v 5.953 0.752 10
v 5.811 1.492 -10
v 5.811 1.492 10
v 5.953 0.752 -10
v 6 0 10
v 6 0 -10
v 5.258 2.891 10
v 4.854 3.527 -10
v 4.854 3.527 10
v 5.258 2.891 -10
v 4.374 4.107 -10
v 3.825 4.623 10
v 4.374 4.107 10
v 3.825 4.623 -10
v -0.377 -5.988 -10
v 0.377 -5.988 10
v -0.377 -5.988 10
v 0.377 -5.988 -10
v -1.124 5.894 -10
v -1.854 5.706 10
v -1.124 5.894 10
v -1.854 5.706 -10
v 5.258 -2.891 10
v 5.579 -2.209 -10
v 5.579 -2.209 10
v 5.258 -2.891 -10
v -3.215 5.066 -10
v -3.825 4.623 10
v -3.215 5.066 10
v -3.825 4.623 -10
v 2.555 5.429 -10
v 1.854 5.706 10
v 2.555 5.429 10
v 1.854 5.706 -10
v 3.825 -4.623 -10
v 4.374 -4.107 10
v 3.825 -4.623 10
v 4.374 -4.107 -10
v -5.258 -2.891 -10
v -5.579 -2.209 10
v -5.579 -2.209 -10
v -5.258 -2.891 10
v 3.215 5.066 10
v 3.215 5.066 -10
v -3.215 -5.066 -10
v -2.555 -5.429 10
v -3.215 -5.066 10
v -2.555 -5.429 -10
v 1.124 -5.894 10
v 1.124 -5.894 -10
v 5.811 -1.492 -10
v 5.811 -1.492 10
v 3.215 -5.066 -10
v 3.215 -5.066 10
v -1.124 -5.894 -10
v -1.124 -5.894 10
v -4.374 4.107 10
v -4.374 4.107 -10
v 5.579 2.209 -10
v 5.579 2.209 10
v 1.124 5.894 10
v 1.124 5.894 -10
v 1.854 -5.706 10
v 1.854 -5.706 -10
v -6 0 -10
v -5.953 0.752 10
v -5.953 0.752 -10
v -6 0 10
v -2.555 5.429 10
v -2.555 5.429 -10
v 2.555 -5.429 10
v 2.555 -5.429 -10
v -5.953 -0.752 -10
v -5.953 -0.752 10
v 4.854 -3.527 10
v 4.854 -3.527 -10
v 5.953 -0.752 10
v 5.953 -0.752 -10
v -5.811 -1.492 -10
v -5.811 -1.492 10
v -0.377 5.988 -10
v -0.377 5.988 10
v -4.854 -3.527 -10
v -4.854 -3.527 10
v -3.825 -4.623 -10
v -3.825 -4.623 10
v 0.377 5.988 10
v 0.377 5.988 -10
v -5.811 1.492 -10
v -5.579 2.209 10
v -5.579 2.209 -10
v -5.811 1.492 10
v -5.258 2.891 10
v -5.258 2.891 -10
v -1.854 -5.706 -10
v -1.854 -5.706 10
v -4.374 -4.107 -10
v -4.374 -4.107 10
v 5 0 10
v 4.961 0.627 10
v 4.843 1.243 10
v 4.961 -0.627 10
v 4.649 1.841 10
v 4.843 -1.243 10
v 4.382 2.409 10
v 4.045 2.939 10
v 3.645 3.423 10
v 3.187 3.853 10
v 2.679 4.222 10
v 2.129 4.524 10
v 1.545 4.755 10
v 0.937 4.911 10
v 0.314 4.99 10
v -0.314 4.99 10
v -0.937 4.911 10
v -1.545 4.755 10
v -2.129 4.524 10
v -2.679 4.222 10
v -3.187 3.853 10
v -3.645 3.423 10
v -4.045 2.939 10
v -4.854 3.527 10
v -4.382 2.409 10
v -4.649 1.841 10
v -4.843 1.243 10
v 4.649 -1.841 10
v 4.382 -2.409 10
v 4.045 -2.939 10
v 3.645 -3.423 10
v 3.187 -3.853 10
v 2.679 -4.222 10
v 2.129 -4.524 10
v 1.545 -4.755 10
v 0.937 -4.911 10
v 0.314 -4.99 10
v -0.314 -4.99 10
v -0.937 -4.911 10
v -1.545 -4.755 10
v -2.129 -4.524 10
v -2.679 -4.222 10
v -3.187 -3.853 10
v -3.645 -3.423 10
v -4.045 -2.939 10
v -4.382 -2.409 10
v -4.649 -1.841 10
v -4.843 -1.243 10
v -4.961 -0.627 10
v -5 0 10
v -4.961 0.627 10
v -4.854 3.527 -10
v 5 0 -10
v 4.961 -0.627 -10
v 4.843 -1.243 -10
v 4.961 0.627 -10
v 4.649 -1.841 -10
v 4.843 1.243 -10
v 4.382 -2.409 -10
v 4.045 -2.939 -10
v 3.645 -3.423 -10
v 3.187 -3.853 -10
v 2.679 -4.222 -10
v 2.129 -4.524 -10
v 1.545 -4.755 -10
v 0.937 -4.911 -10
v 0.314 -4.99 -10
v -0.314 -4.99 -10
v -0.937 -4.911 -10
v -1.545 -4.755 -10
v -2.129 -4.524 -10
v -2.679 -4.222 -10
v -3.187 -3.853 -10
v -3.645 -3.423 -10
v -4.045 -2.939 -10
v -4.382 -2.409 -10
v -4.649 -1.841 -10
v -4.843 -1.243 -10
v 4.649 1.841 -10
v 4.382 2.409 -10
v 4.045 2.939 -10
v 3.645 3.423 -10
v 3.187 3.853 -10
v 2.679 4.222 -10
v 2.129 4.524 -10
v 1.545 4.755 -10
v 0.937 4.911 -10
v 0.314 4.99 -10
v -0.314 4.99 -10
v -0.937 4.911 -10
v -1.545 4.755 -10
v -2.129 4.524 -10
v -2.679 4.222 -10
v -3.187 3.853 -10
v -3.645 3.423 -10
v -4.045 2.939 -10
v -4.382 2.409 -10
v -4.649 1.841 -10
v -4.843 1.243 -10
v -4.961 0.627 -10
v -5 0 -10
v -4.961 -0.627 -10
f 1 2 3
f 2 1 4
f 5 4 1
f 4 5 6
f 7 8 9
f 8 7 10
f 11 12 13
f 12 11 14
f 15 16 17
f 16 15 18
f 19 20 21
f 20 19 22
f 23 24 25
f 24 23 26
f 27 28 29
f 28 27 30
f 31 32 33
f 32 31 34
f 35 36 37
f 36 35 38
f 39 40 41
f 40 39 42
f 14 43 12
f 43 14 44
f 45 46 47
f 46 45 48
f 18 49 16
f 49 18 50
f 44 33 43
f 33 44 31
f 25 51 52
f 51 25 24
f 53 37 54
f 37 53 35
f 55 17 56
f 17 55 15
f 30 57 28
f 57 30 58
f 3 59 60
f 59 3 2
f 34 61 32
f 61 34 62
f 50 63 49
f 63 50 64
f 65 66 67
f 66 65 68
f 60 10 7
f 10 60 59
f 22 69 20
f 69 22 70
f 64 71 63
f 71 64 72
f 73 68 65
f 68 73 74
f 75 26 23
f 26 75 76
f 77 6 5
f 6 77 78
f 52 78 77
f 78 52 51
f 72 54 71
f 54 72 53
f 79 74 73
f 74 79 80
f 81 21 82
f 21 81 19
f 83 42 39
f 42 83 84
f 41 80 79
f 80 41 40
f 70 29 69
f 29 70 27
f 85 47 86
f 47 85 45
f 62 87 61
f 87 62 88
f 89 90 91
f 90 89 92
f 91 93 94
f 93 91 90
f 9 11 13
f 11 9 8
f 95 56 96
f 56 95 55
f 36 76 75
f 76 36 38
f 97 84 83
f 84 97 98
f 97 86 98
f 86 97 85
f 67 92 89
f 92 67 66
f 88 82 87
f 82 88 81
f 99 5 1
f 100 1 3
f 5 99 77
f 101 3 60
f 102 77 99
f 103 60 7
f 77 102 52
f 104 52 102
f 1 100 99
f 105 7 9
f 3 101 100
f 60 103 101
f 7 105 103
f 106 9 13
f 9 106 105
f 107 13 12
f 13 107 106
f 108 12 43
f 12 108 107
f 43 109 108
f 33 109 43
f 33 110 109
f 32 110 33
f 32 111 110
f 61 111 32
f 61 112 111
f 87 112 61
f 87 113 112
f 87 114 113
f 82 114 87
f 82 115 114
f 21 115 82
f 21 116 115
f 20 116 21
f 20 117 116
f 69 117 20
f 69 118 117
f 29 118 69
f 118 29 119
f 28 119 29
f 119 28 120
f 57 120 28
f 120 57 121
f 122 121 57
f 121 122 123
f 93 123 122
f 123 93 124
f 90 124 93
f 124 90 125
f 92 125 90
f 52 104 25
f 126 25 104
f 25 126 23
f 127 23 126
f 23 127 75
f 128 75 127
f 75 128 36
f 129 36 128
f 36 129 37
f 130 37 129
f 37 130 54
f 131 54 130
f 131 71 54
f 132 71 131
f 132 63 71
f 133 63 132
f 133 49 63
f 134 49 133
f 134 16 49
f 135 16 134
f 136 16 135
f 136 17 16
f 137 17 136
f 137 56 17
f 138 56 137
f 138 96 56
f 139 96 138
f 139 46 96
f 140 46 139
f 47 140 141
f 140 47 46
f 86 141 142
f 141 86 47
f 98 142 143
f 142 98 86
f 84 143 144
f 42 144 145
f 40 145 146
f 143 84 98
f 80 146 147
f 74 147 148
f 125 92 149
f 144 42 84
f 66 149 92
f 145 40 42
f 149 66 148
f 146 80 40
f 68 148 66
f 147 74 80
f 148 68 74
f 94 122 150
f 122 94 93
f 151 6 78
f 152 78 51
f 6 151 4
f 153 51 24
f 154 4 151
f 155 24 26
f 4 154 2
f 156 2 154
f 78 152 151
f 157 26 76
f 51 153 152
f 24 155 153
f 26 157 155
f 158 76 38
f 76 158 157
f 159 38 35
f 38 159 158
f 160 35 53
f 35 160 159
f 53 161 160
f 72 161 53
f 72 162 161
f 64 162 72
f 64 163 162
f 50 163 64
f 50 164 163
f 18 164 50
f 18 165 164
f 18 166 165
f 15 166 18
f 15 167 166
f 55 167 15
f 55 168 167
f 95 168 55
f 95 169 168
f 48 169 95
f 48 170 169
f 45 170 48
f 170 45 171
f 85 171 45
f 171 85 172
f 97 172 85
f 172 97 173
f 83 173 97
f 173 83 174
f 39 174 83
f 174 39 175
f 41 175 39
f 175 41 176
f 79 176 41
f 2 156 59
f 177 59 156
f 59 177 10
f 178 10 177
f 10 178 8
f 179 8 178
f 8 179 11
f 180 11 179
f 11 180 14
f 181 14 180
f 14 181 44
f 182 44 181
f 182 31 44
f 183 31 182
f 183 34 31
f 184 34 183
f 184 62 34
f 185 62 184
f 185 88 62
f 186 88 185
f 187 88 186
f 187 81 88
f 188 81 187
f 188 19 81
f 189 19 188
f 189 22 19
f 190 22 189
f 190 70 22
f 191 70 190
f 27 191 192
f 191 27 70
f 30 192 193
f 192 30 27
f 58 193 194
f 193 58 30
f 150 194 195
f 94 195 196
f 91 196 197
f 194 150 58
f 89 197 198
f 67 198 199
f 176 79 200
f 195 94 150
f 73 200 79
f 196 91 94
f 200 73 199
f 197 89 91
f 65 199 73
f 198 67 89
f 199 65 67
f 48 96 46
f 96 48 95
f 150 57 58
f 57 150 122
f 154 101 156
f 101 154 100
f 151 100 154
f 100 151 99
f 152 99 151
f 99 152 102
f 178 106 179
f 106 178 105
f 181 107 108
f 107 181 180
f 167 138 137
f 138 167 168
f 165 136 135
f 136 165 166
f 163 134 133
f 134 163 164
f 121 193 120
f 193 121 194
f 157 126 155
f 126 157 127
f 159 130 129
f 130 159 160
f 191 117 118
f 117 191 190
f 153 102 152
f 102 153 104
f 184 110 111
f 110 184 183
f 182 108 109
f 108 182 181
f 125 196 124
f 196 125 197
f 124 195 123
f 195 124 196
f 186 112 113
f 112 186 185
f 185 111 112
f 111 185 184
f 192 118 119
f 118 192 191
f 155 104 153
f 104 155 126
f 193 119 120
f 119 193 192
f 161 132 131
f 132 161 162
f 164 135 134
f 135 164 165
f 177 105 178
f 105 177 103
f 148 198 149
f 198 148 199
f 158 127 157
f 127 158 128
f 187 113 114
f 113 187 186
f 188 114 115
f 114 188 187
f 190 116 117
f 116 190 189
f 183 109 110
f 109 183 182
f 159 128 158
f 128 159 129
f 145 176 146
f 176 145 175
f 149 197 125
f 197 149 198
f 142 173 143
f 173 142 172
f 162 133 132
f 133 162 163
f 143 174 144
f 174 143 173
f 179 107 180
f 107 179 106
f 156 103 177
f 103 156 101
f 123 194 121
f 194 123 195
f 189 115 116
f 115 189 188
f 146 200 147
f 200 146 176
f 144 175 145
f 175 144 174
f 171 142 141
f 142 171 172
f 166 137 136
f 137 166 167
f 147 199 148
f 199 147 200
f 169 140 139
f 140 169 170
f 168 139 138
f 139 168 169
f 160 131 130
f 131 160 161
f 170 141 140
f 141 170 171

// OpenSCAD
$fn = 50;


difference() {
	union() {
		translate(v = [0, 0, -10.0000000000]) {
			cylinder(h = 20, r = 6.0000000000);
		}
	}
	union() {
		translate(v = [0, 0, -100.0000000000]) {
			cylinder(h = 200, r = 5.0000000000);
		}
	}
}
